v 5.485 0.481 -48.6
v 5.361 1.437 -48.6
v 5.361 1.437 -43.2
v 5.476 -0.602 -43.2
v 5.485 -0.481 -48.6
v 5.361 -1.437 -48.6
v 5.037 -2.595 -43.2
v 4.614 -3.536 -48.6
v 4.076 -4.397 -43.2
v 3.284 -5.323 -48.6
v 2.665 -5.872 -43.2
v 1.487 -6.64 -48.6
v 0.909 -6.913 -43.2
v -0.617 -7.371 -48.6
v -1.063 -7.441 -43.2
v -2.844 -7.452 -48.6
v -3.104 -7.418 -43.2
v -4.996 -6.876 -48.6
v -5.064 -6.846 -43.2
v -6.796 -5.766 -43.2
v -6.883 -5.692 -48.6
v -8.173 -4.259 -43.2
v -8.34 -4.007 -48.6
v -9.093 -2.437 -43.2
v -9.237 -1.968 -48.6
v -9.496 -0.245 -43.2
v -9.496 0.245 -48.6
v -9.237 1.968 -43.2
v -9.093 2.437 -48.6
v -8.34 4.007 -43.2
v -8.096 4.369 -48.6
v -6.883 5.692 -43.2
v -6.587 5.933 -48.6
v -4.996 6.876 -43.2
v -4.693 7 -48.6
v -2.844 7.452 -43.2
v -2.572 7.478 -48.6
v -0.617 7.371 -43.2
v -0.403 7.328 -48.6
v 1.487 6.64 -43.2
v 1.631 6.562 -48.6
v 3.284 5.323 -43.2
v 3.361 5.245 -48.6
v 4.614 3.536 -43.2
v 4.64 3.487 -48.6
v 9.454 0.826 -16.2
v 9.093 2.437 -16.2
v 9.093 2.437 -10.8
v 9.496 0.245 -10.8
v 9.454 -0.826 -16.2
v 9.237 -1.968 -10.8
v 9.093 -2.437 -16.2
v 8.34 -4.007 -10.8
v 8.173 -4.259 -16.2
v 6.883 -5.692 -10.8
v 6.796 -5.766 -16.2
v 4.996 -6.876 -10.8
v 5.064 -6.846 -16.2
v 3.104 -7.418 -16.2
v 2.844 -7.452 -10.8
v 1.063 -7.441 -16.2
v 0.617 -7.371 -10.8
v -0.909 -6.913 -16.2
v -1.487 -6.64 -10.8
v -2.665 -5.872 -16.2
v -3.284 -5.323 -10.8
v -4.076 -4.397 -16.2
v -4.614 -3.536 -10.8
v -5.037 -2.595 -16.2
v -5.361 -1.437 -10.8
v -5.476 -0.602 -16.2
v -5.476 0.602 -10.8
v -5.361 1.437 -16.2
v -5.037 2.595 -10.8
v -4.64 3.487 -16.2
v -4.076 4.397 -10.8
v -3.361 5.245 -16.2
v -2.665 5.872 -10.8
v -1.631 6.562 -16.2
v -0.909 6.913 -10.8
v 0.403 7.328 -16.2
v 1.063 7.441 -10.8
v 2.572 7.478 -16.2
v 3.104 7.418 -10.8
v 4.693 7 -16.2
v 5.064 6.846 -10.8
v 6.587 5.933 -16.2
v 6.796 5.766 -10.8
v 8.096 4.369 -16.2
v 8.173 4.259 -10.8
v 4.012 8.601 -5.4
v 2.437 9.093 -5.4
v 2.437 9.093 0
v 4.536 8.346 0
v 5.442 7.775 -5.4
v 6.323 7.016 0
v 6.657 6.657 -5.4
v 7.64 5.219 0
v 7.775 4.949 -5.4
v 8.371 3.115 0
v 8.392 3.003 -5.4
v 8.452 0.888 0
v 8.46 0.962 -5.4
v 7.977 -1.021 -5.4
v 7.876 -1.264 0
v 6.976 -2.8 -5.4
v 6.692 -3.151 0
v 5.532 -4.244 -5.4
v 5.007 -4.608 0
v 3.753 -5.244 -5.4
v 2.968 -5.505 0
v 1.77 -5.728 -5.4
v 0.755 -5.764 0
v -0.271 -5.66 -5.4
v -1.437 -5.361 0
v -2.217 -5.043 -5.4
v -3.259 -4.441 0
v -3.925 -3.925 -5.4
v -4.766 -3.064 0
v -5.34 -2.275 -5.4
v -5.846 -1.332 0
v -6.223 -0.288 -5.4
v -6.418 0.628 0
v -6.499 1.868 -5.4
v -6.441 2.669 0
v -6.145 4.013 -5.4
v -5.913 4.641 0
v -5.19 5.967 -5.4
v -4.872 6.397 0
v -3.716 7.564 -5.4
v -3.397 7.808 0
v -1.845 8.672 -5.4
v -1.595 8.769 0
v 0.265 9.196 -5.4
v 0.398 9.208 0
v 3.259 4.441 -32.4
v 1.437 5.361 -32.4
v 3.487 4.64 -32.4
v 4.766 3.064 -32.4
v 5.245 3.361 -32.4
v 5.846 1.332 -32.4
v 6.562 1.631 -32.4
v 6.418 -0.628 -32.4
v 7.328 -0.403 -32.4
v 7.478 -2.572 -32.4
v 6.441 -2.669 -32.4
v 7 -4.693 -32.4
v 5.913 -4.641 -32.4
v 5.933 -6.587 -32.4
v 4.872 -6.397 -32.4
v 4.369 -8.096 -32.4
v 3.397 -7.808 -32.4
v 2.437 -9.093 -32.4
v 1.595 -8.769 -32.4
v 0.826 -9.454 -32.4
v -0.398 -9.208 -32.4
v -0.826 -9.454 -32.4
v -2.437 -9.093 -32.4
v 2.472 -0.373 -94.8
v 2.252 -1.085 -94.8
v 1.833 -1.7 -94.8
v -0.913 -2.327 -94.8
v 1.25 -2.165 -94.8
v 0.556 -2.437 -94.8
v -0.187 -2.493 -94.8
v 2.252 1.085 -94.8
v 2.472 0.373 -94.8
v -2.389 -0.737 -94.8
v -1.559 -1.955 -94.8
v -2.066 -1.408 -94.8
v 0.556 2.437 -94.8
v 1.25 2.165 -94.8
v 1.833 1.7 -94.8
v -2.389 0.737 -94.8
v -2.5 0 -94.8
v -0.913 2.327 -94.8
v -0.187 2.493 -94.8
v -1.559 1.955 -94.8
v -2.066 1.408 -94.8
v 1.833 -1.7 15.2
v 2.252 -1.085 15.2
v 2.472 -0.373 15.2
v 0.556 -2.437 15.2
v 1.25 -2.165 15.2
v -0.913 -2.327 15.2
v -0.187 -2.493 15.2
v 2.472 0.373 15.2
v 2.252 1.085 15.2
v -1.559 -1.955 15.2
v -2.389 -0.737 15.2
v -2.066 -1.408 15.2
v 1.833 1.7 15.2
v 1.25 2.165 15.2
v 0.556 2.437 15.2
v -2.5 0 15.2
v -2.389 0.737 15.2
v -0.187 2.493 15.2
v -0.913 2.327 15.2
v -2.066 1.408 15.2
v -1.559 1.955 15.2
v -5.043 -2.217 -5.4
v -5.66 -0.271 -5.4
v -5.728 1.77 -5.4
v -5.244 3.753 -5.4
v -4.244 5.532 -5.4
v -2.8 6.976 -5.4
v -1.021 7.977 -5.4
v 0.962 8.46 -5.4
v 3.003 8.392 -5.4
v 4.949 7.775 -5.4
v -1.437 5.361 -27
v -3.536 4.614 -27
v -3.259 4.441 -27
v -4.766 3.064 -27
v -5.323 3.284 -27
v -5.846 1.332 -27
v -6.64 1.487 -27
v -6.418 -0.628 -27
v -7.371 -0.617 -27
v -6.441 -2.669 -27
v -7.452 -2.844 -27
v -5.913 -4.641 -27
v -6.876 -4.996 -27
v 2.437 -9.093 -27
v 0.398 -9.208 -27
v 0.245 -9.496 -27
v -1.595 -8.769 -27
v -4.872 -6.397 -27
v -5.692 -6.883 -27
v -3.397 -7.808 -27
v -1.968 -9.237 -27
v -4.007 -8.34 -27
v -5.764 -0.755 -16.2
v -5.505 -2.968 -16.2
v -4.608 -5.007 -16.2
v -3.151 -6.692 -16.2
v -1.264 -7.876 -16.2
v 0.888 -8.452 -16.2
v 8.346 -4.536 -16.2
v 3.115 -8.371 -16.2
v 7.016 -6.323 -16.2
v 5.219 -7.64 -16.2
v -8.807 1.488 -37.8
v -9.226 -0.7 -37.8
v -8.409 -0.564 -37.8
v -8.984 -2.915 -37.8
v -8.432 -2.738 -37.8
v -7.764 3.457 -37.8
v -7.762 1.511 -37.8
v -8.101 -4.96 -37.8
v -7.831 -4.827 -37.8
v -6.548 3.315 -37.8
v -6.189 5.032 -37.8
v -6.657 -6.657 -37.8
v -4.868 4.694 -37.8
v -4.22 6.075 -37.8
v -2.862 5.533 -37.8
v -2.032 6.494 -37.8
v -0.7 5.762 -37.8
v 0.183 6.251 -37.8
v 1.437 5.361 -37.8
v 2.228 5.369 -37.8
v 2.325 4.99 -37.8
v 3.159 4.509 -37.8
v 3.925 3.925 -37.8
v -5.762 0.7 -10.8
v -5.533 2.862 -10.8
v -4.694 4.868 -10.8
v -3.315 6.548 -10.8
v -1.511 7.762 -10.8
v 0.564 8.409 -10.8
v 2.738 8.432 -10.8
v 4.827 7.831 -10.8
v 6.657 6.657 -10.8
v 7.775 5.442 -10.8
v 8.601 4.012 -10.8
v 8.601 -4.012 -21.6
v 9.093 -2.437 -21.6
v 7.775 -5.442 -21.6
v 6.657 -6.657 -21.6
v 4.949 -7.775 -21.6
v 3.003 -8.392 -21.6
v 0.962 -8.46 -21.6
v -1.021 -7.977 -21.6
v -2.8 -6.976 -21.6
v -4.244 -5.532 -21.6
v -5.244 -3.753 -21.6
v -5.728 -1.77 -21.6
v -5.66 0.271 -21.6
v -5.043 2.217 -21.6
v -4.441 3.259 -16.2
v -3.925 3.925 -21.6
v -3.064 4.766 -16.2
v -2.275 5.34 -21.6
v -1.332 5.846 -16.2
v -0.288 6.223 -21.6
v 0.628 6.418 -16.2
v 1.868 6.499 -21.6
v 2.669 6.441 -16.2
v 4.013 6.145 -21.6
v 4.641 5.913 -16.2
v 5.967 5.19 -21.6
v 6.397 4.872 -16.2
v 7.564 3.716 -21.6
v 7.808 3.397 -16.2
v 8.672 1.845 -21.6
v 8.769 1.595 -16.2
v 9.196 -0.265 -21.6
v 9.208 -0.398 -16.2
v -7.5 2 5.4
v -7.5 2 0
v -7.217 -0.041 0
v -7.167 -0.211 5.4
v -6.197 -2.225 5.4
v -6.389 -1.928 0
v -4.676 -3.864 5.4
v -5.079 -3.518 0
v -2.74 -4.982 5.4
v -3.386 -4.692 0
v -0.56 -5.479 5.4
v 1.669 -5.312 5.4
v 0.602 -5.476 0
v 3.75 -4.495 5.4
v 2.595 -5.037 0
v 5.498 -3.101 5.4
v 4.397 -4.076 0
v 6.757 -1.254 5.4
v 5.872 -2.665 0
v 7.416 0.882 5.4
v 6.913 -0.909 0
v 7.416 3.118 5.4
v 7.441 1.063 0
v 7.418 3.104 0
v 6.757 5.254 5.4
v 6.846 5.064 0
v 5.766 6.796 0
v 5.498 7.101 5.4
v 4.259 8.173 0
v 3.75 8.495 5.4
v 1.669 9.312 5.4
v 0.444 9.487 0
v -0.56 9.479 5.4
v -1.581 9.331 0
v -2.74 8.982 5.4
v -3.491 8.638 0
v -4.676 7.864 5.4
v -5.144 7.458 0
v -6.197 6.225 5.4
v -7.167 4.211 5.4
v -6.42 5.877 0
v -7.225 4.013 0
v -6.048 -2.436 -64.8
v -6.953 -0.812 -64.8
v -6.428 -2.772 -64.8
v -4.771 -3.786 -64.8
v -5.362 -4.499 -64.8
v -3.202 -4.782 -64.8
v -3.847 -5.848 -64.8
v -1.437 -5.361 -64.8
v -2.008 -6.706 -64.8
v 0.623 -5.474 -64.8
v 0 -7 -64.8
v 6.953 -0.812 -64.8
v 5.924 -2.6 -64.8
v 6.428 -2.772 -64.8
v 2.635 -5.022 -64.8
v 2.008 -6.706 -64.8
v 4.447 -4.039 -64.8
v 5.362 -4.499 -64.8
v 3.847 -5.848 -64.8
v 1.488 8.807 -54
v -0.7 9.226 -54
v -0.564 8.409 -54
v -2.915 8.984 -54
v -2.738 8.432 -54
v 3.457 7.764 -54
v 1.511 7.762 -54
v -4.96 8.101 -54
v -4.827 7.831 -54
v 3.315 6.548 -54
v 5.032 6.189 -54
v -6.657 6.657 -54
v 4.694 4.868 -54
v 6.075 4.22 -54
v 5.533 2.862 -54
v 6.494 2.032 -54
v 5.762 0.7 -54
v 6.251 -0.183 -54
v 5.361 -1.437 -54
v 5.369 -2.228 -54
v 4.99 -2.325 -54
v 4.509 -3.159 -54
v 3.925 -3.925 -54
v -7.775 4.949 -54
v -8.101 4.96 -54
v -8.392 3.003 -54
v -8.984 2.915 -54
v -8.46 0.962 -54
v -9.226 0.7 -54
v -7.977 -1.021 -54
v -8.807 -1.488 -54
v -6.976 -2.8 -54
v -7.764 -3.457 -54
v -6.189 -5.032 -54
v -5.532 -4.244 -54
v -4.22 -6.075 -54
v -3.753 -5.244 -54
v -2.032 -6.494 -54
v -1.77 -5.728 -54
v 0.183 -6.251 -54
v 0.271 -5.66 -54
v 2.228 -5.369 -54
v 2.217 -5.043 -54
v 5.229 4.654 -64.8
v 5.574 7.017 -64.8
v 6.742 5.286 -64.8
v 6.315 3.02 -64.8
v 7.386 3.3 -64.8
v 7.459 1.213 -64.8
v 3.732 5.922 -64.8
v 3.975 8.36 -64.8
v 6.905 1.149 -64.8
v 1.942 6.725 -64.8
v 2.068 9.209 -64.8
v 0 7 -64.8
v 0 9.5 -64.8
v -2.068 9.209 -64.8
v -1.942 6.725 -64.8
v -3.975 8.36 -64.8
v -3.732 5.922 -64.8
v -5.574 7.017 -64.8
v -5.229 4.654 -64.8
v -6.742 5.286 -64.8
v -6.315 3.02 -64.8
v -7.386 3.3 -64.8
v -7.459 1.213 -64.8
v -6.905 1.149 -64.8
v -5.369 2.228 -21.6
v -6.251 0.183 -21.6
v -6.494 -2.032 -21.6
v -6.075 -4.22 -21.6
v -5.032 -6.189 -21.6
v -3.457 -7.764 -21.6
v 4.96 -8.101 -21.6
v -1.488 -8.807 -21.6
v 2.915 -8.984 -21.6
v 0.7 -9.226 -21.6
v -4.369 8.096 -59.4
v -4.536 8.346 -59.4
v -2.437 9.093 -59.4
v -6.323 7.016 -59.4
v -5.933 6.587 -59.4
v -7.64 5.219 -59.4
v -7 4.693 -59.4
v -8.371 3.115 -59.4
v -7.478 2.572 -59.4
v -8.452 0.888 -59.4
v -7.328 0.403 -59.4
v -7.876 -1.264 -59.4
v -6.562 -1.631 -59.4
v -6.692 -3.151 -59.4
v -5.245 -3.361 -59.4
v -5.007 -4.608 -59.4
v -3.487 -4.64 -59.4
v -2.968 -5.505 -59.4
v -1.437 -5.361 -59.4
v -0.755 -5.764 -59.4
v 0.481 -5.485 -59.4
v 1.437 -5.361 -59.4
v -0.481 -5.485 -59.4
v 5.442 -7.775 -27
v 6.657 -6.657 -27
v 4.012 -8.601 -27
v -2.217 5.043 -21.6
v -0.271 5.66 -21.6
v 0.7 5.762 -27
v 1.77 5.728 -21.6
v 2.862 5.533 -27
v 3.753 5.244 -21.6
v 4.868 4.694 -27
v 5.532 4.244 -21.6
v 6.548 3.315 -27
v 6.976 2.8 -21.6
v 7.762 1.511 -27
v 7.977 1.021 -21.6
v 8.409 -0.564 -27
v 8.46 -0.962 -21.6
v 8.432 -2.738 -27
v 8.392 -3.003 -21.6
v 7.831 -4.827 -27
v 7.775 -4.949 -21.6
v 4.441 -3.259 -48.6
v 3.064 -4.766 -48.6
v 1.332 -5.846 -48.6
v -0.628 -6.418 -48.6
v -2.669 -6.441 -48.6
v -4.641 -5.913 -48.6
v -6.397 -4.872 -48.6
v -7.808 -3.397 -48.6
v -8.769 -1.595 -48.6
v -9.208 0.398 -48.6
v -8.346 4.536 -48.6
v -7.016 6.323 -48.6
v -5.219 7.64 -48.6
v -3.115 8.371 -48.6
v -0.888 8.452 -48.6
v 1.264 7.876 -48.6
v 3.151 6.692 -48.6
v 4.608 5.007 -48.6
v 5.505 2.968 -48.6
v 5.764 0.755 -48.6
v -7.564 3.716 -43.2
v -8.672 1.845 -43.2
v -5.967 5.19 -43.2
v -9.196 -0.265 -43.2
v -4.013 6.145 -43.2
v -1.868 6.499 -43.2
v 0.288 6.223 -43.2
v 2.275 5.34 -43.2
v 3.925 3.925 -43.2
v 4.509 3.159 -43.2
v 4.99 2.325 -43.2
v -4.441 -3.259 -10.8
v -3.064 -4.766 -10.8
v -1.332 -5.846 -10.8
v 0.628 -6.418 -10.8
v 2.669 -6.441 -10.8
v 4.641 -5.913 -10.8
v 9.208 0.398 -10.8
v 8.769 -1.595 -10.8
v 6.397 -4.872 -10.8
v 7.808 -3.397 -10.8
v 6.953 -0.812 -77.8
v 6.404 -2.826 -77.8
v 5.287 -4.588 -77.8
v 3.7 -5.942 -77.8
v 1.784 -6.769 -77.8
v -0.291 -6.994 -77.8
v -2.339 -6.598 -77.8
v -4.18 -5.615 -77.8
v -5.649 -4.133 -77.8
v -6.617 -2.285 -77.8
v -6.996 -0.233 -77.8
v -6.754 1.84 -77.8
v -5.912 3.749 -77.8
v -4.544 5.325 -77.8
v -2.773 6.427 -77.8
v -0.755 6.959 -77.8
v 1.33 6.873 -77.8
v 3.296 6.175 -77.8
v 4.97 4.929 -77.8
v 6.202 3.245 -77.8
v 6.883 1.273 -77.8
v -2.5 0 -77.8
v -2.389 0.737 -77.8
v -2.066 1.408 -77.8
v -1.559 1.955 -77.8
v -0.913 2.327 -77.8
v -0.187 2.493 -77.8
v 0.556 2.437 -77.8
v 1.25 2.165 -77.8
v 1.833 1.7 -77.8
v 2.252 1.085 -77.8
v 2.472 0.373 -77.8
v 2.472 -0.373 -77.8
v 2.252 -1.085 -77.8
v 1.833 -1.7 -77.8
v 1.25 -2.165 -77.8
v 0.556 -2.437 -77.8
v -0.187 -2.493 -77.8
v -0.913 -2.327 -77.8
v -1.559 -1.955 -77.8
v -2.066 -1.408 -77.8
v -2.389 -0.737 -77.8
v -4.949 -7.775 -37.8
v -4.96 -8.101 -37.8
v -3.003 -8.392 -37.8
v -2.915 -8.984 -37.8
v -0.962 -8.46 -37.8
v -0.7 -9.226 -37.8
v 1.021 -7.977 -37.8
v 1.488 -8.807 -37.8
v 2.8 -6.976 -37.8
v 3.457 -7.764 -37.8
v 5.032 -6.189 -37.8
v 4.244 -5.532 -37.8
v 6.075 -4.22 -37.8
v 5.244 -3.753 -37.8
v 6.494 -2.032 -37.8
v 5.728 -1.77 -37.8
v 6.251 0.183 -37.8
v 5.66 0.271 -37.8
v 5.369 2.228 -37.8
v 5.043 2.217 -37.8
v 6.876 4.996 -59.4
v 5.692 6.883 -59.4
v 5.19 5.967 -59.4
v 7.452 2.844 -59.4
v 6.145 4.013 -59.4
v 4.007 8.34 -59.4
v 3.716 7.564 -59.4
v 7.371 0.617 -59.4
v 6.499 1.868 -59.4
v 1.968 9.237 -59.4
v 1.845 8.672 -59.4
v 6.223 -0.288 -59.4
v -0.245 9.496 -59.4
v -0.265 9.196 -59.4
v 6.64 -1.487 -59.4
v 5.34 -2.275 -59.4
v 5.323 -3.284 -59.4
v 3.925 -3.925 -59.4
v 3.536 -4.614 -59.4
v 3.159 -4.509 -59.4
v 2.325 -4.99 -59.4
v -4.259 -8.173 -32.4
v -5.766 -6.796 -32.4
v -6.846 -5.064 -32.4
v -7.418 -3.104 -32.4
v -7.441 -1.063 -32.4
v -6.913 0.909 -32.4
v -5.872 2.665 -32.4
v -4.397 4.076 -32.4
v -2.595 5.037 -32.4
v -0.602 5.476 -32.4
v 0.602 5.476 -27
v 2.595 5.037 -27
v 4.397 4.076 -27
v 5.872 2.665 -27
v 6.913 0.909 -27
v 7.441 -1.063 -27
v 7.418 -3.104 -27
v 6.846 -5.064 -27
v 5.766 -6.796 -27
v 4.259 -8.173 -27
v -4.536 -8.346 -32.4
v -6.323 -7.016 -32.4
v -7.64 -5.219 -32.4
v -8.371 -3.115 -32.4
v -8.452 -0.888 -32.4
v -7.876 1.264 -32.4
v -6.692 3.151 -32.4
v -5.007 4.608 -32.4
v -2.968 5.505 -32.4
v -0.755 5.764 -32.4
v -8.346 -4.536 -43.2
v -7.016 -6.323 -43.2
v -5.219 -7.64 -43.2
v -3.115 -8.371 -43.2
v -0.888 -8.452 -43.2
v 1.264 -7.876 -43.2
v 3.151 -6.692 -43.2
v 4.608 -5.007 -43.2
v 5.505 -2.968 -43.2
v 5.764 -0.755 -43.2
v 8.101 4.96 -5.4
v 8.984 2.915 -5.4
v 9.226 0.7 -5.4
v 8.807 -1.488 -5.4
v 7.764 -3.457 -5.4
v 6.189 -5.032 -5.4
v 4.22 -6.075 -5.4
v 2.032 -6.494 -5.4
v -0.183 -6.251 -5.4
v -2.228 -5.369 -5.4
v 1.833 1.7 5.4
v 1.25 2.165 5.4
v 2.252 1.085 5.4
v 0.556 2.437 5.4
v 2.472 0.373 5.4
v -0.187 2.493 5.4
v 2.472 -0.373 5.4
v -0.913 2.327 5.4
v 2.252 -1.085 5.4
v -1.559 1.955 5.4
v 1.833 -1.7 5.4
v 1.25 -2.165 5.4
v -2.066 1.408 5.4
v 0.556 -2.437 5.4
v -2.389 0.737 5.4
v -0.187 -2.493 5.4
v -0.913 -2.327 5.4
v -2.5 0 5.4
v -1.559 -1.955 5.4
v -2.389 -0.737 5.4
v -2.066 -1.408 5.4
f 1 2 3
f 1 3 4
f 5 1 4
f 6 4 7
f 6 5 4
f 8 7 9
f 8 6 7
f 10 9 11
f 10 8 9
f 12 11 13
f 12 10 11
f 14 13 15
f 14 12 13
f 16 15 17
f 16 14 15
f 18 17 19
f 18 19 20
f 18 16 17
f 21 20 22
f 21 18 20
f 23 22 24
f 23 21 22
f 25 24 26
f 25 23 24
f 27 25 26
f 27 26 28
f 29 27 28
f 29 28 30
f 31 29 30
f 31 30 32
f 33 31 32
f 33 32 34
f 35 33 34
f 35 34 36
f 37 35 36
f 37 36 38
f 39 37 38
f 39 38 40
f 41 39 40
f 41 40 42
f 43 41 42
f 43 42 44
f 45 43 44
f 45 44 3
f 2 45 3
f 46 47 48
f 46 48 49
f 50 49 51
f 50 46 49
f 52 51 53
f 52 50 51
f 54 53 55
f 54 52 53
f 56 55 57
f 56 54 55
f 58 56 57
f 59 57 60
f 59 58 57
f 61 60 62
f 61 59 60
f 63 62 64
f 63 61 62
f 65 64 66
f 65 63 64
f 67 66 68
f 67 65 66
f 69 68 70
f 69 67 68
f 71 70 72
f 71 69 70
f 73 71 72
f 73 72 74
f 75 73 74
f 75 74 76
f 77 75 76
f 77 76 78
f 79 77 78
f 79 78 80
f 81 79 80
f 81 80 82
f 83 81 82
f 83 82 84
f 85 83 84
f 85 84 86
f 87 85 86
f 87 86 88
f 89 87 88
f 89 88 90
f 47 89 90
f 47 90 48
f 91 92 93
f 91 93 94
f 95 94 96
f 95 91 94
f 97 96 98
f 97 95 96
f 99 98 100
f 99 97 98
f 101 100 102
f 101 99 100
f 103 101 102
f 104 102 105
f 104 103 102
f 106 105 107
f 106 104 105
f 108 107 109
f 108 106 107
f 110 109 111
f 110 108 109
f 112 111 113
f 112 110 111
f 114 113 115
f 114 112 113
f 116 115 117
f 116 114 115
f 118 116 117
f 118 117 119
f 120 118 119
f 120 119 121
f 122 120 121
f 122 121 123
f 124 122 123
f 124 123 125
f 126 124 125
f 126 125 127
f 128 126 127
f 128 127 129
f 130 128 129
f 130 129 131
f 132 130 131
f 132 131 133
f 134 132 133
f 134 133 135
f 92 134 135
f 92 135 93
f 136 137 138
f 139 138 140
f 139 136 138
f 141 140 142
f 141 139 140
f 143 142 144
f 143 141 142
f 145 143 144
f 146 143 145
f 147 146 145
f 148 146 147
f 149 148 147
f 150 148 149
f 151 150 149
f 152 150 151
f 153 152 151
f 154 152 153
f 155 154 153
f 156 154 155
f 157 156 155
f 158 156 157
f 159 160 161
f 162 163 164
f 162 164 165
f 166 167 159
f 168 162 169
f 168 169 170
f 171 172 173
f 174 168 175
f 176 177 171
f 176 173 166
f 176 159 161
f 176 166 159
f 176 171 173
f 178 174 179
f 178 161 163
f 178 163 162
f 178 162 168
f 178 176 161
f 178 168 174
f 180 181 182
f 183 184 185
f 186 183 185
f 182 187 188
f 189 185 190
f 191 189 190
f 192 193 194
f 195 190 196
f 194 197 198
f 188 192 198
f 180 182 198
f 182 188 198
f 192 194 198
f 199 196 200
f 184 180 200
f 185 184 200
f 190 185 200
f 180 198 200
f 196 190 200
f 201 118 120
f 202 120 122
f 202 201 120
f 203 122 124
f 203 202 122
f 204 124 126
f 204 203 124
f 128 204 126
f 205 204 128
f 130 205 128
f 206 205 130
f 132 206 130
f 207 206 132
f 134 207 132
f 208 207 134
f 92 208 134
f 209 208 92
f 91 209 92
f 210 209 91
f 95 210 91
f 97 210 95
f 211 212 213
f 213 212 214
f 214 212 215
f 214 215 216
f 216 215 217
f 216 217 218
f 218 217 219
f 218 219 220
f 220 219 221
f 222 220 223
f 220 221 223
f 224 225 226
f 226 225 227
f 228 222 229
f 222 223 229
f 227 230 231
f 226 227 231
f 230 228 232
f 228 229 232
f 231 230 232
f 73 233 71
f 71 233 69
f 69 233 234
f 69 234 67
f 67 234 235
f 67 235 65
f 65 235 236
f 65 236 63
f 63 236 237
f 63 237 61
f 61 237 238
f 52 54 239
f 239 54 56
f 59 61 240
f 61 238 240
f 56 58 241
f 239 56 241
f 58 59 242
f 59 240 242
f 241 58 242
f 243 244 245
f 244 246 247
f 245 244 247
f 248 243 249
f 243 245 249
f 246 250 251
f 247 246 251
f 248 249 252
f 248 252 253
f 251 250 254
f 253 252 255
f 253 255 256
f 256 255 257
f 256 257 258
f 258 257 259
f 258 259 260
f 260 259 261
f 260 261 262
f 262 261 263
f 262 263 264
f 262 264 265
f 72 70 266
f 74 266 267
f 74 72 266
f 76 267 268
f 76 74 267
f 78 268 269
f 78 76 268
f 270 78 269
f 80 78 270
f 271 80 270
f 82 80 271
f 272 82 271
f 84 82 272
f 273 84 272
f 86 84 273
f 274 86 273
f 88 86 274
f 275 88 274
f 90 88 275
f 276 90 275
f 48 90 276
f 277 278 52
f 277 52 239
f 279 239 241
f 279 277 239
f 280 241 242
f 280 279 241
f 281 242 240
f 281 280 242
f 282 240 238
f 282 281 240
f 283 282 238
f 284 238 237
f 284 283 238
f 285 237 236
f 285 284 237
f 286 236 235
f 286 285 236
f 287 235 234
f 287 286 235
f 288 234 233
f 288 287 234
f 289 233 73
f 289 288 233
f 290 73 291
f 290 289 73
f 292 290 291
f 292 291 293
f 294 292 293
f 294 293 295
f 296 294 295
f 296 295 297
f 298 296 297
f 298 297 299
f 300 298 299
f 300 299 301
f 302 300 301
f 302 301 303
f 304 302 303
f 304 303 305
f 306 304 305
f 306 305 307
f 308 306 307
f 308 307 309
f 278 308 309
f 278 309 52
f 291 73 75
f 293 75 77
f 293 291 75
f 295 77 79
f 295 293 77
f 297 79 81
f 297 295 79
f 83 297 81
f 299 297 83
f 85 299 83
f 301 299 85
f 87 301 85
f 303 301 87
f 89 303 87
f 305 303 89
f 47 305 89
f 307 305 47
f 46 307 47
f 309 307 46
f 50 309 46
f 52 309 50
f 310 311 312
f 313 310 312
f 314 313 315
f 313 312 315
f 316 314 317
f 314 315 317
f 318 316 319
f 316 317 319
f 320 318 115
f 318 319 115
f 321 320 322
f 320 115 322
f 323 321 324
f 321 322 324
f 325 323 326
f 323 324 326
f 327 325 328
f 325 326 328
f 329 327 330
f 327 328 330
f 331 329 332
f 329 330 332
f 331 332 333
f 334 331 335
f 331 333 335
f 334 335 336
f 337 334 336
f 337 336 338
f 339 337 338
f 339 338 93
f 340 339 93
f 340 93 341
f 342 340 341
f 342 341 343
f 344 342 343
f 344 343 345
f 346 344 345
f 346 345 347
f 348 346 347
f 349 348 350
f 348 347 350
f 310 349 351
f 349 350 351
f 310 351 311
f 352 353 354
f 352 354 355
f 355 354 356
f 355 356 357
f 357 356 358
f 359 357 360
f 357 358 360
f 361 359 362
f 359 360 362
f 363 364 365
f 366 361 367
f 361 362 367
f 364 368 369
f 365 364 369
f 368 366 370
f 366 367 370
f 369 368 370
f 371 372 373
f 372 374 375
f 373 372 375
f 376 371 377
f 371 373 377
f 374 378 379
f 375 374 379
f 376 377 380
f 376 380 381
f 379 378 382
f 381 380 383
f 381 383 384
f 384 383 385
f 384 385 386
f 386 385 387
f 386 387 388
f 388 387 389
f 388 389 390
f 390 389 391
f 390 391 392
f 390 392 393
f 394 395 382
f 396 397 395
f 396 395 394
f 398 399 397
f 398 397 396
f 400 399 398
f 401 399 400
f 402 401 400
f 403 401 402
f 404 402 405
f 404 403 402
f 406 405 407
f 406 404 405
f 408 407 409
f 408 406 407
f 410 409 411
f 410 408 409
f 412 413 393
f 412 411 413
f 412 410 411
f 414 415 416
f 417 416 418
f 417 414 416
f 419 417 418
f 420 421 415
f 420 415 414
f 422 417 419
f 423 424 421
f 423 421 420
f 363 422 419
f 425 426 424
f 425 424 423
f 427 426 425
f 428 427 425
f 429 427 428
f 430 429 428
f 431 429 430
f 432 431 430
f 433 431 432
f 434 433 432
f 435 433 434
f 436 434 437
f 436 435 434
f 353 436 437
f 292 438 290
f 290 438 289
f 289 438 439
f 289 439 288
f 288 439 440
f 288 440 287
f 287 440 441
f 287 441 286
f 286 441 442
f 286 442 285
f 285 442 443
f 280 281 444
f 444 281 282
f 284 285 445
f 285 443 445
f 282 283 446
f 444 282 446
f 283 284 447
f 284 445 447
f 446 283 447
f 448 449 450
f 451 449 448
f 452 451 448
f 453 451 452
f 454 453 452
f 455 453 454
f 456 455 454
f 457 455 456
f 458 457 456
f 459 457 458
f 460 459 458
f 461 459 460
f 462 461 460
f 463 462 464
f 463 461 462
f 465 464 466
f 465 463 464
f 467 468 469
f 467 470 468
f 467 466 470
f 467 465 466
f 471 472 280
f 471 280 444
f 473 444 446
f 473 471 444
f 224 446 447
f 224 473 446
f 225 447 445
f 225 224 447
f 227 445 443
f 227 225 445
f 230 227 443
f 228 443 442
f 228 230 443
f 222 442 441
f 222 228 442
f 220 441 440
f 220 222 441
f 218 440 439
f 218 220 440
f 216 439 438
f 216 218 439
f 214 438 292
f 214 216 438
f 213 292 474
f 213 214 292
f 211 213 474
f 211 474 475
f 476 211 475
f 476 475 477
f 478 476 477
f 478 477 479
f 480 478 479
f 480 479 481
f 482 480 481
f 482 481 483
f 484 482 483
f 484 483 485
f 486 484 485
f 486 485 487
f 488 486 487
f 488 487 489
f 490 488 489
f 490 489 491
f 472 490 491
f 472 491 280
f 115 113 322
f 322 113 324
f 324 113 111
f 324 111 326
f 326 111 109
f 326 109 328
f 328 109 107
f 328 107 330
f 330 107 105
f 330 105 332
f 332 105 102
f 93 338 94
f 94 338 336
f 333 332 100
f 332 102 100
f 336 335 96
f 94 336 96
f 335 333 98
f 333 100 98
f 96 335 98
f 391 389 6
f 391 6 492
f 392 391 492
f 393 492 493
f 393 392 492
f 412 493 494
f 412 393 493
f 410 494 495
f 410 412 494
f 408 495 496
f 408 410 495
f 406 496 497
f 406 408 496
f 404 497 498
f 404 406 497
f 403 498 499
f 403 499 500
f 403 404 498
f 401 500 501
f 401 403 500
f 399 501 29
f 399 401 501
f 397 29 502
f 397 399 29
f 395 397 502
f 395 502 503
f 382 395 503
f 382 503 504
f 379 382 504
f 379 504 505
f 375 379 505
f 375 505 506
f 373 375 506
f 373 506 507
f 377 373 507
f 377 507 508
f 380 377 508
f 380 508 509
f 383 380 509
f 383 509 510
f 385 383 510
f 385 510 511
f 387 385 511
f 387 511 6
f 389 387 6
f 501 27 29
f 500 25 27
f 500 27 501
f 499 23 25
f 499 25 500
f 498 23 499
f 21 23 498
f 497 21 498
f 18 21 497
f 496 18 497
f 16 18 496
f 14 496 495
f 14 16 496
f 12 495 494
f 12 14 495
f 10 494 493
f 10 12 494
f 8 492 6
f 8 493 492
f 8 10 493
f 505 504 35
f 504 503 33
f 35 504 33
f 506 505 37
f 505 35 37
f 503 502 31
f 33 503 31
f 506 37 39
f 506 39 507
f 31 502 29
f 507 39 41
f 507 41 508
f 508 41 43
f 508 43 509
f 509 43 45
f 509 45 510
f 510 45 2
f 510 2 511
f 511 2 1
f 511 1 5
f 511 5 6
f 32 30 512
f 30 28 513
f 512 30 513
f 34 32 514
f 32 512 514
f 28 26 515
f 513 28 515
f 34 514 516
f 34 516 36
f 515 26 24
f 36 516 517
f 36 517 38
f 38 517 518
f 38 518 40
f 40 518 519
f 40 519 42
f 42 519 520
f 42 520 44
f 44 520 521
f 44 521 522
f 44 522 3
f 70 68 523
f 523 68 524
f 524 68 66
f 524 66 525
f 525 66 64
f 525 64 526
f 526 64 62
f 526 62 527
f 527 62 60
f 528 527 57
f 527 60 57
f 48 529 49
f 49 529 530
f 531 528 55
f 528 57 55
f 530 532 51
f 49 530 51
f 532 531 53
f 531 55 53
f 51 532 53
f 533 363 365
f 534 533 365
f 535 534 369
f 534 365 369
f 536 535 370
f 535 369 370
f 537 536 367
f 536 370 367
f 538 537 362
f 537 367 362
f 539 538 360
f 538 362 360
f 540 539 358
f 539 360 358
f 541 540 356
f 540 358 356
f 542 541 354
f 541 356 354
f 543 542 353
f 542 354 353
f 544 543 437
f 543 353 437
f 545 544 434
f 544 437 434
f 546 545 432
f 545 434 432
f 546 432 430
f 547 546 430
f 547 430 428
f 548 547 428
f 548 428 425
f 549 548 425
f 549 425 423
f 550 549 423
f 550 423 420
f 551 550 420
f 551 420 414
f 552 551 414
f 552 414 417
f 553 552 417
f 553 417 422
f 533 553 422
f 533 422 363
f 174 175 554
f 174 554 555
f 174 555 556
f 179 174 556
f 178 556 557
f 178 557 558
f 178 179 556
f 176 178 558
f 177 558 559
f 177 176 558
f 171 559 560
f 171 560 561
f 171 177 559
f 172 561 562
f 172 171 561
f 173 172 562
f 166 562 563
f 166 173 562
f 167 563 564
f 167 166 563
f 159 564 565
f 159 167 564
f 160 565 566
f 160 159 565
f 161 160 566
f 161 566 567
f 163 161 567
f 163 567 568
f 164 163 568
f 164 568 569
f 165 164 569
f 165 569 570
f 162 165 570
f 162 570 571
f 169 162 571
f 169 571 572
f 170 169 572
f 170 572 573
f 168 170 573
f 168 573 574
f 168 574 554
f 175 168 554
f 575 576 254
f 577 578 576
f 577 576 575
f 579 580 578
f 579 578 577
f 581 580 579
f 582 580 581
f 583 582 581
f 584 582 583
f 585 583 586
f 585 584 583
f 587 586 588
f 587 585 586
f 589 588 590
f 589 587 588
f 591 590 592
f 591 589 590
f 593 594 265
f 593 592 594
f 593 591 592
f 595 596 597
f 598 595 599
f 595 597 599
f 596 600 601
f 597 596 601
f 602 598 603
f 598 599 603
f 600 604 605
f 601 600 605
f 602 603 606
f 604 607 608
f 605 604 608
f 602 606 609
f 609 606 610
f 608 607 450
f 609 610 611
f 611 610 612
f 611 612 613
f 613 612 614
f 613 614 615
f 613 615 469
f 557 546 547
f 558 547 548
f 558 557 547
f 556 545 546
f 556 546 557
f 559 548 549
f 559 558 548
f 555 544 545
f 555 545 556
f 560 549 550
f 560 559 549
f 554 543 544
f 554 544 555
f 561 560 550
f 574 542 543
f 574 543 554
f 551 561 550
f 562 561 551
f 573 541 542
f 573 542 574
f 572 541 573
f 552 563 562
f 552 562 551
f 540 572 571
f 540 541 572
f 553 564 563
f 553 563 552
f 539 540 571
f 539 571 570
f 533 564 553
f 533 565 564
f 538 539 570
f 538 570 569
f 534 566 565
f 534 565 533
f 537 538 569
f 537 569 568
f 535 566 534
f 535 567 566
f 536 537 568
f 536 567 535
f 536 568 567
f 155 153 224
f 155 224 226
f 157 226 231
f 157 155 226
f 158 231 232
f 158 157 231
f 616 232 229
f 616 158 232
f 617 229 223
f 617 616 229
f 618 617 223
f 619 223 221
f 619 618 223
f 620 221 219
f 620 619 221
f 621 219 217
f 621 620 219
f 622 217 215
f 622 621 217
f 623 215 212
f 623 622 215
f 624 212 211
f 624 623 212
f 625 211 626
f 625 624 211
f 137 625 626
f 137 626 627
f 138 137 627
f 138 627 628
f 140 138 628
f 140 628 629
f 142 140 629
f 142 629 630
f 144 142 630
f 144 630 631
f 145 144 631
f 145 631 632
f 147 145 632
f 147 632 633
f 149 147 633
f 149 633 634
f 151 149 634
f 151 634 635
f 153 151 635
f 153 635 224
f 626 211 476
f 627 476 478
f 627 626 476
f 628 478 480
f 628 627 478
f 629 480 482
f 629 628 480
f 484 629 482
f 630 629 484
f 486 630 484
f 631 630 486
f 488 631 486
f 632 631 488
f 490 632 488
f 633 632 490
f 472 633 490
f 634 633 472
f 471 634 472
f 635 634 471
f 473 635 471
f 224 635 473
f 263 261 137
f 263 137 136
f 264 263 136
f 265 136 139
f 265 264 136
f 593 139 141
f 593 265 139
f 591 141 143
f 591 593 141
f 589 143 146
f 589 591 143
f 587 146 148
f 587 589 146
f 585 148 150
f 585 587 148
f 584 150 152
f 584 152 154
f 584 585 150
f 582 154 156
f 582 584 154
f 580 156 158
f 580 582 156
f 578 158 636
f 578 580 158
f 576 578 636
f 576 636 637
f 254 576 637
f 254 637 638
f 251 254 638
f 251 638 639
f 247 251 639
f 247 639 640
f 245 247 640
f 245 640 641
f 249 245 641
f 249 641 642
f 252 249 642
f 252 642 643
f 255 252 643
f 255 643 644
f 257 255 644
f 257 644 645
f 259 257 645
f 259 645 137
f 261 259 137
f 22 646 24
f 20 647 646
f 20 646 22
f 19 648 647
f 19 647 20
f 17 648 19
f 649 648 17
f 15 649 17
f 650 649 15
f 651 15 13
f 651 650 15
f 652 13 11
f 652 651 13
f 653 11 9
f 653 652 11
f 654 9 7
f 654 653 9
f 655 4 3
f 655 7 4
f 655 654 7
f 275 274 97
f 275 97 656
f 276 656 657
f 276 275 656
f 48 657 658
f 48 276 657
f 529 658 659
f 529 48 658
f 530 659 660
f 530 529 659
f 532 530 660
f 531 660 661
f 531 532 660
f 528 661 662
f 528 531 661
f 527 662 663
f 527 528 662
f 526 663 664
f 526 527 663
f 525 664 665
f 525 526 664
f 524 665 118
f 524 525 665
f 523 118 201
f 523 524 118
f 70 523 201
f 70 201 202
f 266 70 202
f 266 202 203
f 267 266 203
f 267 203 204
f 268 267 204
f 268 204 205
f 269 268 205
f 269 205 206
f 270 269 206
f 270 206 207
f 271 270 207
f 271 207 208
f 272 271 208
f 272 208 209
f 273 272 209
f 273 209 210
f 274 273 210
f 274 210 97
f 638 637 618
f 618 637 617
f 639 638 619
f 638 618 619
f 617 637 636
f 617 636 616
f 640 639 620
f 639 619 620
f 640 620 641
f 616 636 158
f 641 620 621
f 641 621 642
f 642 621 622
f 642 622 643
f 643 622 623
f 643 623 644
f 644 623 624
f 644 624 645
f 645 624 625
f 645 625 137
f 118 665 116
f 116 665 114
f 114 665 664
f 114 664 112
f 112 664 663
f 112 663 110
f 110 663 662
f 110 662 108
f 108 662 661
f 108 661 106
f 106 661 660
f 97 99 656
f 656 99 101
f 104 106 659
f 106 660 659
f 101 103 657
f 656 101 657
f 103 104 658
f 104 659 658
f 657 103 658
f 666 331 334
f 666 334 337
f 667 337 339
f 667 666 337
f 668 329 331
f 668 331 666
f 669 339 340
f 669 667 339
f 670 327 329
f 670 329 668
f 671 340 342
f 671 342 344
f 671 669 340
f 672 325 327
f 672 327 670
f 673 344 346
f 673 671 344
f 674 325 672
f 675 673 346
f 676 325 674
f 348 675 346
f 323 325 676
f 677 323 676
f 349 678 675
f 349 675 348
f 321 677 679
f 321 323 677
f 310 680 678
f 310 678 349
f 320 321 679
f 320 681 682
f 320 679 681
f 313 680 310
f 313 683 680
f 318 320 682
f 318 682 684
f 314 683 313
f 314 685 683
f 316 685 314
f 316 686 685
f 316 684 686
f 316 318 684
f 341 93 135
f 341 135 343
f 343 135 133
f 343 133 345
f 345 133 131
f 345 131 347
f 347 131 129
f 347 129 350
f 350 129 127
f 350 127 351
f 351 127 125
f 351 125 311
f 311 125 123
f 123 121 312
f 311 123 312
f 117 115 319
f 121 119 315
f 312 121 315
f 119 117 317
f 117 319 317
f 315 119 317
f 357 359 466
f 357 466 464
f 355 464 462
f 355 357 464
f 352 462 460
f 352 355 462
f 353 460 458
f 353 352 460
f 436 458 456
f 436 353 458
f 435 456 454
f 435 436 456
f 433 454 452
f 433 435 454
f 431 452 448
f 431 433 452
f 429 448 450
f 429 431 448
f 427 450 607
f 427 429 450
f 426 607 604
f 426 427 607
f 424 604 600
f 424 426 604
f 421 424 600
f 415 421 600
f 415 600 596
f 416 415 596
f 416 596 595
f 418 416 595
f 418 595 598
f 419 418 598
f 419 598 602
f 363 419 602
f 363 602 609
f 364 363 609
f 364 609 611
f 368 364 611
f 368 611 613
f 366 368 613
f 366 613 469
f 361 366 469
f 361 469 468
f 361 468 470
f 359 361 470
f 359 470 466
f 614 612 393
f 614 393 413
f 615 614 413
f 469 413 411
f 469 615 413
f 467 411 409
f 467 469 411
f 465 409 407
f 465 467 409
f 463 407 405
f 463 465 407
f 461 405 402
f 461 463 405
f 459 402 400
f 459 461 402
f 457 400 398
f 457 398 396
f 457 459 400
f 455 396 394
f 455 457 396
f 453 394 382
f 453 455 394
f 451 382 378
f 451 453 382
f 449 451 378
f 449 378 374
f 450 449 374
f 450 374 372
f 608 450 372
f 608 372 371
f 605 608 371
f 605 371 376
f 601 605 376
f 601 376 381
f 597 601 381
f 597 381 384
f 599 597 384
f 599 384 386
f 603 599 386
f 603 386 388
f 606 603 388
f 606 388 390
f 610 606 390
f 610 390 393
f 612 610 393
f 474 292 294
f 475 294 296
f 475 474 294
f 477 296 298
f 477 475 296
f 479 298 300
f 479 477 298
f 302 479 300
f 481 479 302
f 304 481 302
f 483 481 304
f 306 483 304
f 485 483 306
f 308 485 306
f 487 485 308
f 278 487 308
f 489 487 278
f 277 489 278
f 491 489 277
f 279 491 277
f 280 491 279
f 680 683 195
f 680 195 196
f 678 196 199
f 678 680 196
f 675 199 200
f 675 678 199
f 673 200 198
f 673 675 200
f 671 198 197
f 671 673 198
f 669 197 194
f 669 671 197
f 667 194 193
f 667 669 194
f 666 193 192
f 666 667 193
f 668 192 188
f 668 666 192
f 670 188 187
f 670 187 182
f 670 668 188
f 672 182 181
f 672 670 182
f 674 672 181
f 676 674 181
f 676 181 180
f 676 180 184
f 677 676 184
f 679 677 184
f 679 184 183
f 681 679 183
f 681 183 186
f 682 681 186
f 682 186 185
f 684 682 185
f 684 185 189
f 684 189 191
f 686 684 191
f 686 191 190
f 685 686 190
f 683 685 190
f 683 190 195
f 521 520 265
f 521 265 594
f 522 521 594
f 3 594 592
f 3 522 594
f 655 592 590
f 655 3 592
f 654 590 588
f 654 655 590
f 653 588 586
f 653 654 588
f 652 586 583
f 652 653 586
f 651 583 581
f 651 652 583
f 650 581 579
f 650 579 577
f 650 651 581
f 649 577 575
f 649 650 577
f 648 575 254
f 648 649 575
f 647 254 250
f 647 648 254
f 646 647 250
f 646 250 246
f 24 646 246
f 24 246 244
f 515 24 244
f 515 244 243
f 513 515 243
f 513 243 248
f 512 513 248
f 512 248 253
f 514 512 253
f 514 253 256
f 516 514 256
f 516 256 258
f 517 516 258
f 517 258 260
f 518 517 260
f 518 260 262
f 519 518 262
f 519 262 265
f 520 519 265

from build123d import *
from build123d.topology import SkipClean

# Parameters (mm, degrees)
SKETCH1_R            = 7.5
SKETCH1_R_2          = 2.5
BOSS_EXTRUDE1_DEPTH  = 5.4
BOSS_EXTRUDE2_START  = 5.4
SKETCH2_R            = 7.5
SKETCH2_R_2          = 2.5
BOSS_EXTRUDE2_DEPTH  = 5.4
BOSS_EXTRUDE3_START  = 5.4
SKETCH3_R            = 7.5
SKETCH3_R_2          = 2.5
BOSS_EXTRUDE3_DEPTH  = 5.4
BOSS_EXTRUDE4_START  = 5.4
SKETCH4_R            = 7.5
SKETCH4_R_2          = 2.5
BOSS_EXTRUDE4_DEPTH  = 5.4
BOSS_EXTRUDE5_START  = 5.4
SKETCH5_R            = 7.5
SKETCH5_R_2          = 2.5
BOSS_EXTRUDE5_DEPTH  = 5.4
BOSS_EXTRUDE6_START  = 5.4
SKETCH6_R            = 7.5
SKETCH6_R_2          = 2.5
BOSS_EXTRUDE6_DEPTH  = 5.4
BOSS_EXTRUDE7_START  = 5.4
SKETCH7_R            = 7.5
SKETCH7_R_2          = 2.5
BOSS_EXTRUDE7_DEPTH  = 5.4
BOSS_EXTRUDE9_START  = 5.4
SKETCH8_R            = 7.5
SKETCH8_R_2          = 2.5
BOSS_EXTRUDE9_DEPTH  = 5.4
BOSS_EXTRUDE10_START = 5.4
SKETCH9_R            = 7.5
SKETCH9_R_2          = 2.5
BOSS_EXTRUDE10_DEPTH = 5.4
BOSS_EXTRUDE11_START = 5.4
SKETCH10_R           = 7.5
SKETCH10_R_2         = 2.5
BOSS_EXTRUDE11_DEPTH = 5.4
BOSS_EXTRUDE12_START = 5.4
SKETCH11_R           = 7.5
SKETCH11_R_2         = 2.5
BOSS_EXTRUDE12_DEPTH = 5.4
BOSS_EXTRUDE13_START = 5.4
SKETCH12_R           = 7.5
SKETCH12_R_2         = 2.5
BOSS_EXTRUDE13_DEPTH = 5.4
BOSS_EXTRUDE14_START = 5.4
SKETCH13_R           = 7.5
SKETCH13_R_2         = 2.5
BOSS_EXTRUDE14_DEPTH = 5.4
SKETCH14_R           = 2.5
BOSS_EXTRUDE15_DEPTH = 80
BOSS_EXTRUDE16_START = 30
SKETCH14_2_R         = 2.5
BOSS_EXTRUDE16_DEPTH = 30
SKETCH15_R           = 7
BOSS_EXTRUDE17_DEPTH = 13


with BuildPart() as part:
    # Sketch1 → Boss-Extrude1 (new body)
    with BuildSketch(Plane.XY):
        with Locations((0, 2)):
            Circle(SKETCH1_R)
        Circle(SKETCH1_R_2, mode=Mode.SUBTRACT)
    extrude(amount=BOSS_EXTRUDE1_DEPTH)

    # Sketch2 → Boss-Extrude2 (add)
    with SkipClean():  # the faces are left unmerged after this step: merging them gives an invalid solid
        with BuildSketch(Plane(origin=(0, 0, 0), x_dir=(-1, 0, 0), z_dir=(0, 0, -1)).offset(BOSS_EXTRUDE2_START)):
            with Locations((-1, 1.732050808)):
                Circle(SKETCH2_R)
            Circle(SKETCH2_R_2, mode=Mode.SUBTRACT)
        extrude(amount=-BOSS_EXTRUDE2_DEPTH)

    # Sketch3 → Boss-Extrude3 (add)
    with SkipClean():  # the faces are left unmerged after this step: merging them gives an invalid solid
        with BuildSketch(Plane(origin=(0, 0, -5.4), x_dir=(-1, 0, 0), z_dir=(0, 0, -1)).offset(BOSS_EXTRUDE3_START)):
            with Locations((-1.732050808, 1)):
                Circle(SKETCH3_R)
            Circle(SKETCH3_R_2, mode=Mode.SUBTRACT)
        extrude(amount=-BOSS_EXTRUDE3_DEPTH)

    # Sketch4 → Boss-Extrude4 (add)
    with SkipClean():  # the faces are left unmerged after this step: merging them gives an invalid solid
        with BuildSketch(Plane(origin=(0, 0, -10.8), x_dir=(-1, 0, 0), z_dir=(0, 0, -1)).offset(BOSS_EXTRUDE4_START)):
            with Locations((-2, 0)):
                Circle(SKETCH4_R)
            Circle(SKETCH4_R_2, mode=Mode.SUBTRACT)
        extrude(amount=-BOSS_EXTRUDE4_DEPTH)

    # Sketch5 → Boss-Extrude5 (add)
    with SkipClean():  # the faces are left unmerged after this step: merging them gives an invalid solid
        with BuildSketch(Plane(origin=(0, 0, -16.2), x_dir=(-1, 0, 0), z_dir=(0, 0, -1)).offset(BOSS_EXTRUDE5_START)):
            with Locations((-1.732050808, -1)):
                Circle(SKETCH5_R)
            Circle(SKETCH5_R_2, mode=Mode.SUBTRACT)
        extrude(amount=-BOSS_EXTRUDE5_DEPTH)

    # Sketch6 → Boss-Extrude6 (add)
    with SkipClean():  # the faces are left unmerged after this step: merging them gives an invalid solid
        with BuildSketch(Plane(origin=(0, 0, -21.6), x_dir=(-1, 0, 0), z_dir=(0, 0, -1)).offset(BOSS_EXTRUDE6_START)):
            with Locations((-1, -1.732050808)):
                Circle(SKETCH6_R)
            Circle(SKETCH6_R_2, mode=Mode.SUBTRACT)
        extrude(amount=-BOSS_EXTRUDE6_DEPTH)

    # Sketch7 → Boss-Extrude7 (add)
    with SkipClean():  # the faces are left unmerged after this step: merging them gives an invalid solid
        with BuildSketch(Plane(origin=(0, 0, -27), x_dir=(-1, 0, 0), z_dir=(0, 0, -1)).offset(BOSS_EXTRUDE7_START)):
            with Locations((0, -2)):
                Circle(SKETCH7_R)
            Circle(SKETCH7_R_2, mode=Mode.SUBTRACT)
        extrude(amount=-BOSS_EXTRUDE7_DEPTH)

    # Sketch8 → Boss-Extrude9 (add)
    with SkipClean():  # the faces are left unmerged after this step: merging them gives an invalid solid
        with BuildSketch(Plane(origin=(0, 0, -32.4), x_dir=(-1, 0, 0), z_dir=(0, 0, -1)).offset(BOSS_EXTRUDE9_START)):
            with Locations((1, -1.732050808)):
                Circle(SKETCH8_R)
            Circle(SKETCH8_R_2, mode=Mode.SUBTRACT)
        extrude(amount=-BOSS_EXTRUDE9_DEPTH)

    # Sketch9 → Boss-Extrude10 (add)
    with SkipClean():  # the faces are left unmerged after this step: merging them gives an invalid solid
        with BuildSketch(Plane(origin=(0, 0, -37.8), x_dir=(-1, 0, 0), z_dir=(0, 0, -1)).offset(BOSS_EXTRUDE10_START)):
            with Locations((1.732050808, -1)):
                Circle(SKETCH9_R)
            Circle(SKETCH9_R_2, mode=Mode.SUBTRACT)
        extrude(amount=-BOSS_EXTRUDE10_DEPTH)

    # Sketch10 → Boss-Extrude11 (add)
    with SkipClean():  # the faces are left unmerged after this step: merging them gives an invalid solid
        with BuildSketch(Plane(origin=(0, 0, -43.2), x_dir=(-1, 0, 0), z_dir=(0, 0, -1)).offset(BOSS_EXTRUDE11_START)):
            with Locations((2, 0)):
                Circle(SKETCH10_R)
            Circle(SKETCH10_R_2, mode=Mode.SUBTRACT)
        extrude(amount=-BOSS_EXTRUDE11_DEPTH)

    # Sketch11 → Boss-Extrude12 (add)
    with SkipClean():  # the faces are left unmerged after this step: merging them gives an invalid solid
        with BuildSketch(Plane(origin=(0, 0, -48.6), x_dir=(-1, 0, 0), z_dir=(0, 0, -1)).offset(BOSS_EXTRUDE12_START)):
            with Locations((1.732050808, 1)):
                Circle(SKETCH11_R)
            Circle(SKETCH11_R_2, mode=Mode.SUBTRACT)
        extrude(amount=-BOSS_EXTRUDE12_DEPTH)

    # Sketch12 → Boss-Extrude13 (add)
    with SkipClean():  # the faces are left unmerged after this step: merging them gives an invalid solid
        with BuildSketch(Plane(origin=(0, 0, -54), x_dir=(-1, 0, 0), z_dir=(0, 0, -1)).offset(BOSS_EXTRUDE13_START)):
            with Locations((1, 1.732050808)):
                Circle(SKETCH12_R)
            Circle(SKETCH12_R_2, mode=Mode.SUBTRACT)
        extrude(amount=-BOSS_EXTRUDE13_DEPTH)

    # Sketch13 → Boss-Extrude14 (add)
    with SkipClean():  # the faces are left unmerged after this step: merging them gives an invalid solid
        with BuildSketch(Plane(origin=(0, 0, -59.4), x_dir=(-1, 0, 0), z_dir=(0, 0, -1)).offset(BOSS_EXTRUDE14_START)):
            with Locations((0, 2)):
                Circle(SKETCH13_R)
            Circle(SKETCH13_R_2, mode=Mode.SUBTRACT)
        extrude(amount=-BOSS_EXTRUDE14_DEPTH)

    # Sketch14 → Boss-Extrude15 (add)
    with BuildSketch(Plane(origin=(0, 0, -64.8), x_dir=(-1, 0, 0), z_dir=(0, 0, -1))):
        Circle(SKETCH14_R)
    extrude(amount=-BOSS_EXTRUDE15_DEPTH)

    # Sketch14<2> → Boss-Extrude16 (add)
    with BuildSketch(Plane(origin=(0, 0, -64.8), x_dir=(-1, 0, 0), z_dir=(0, 0, -1)).offset(BOSS_EXTRUDE16_START)):
        Circle(SKETCH14_2_R)
    extrude(amount=-BOSS_EXTRUDE16_DEPTH)

    # Sketch15 → Boss-Extrude17 (add)
    with BuildSketch(Plane(origin=(0, 0, -64.8), x_dir=(-1, 0, 0), z_dir=(0, 0, -1))):
        Circle(SKETCH15_R)
    extrude(amount=BOSS_EXTRUDE17_DEPTH)


solid = part.part
